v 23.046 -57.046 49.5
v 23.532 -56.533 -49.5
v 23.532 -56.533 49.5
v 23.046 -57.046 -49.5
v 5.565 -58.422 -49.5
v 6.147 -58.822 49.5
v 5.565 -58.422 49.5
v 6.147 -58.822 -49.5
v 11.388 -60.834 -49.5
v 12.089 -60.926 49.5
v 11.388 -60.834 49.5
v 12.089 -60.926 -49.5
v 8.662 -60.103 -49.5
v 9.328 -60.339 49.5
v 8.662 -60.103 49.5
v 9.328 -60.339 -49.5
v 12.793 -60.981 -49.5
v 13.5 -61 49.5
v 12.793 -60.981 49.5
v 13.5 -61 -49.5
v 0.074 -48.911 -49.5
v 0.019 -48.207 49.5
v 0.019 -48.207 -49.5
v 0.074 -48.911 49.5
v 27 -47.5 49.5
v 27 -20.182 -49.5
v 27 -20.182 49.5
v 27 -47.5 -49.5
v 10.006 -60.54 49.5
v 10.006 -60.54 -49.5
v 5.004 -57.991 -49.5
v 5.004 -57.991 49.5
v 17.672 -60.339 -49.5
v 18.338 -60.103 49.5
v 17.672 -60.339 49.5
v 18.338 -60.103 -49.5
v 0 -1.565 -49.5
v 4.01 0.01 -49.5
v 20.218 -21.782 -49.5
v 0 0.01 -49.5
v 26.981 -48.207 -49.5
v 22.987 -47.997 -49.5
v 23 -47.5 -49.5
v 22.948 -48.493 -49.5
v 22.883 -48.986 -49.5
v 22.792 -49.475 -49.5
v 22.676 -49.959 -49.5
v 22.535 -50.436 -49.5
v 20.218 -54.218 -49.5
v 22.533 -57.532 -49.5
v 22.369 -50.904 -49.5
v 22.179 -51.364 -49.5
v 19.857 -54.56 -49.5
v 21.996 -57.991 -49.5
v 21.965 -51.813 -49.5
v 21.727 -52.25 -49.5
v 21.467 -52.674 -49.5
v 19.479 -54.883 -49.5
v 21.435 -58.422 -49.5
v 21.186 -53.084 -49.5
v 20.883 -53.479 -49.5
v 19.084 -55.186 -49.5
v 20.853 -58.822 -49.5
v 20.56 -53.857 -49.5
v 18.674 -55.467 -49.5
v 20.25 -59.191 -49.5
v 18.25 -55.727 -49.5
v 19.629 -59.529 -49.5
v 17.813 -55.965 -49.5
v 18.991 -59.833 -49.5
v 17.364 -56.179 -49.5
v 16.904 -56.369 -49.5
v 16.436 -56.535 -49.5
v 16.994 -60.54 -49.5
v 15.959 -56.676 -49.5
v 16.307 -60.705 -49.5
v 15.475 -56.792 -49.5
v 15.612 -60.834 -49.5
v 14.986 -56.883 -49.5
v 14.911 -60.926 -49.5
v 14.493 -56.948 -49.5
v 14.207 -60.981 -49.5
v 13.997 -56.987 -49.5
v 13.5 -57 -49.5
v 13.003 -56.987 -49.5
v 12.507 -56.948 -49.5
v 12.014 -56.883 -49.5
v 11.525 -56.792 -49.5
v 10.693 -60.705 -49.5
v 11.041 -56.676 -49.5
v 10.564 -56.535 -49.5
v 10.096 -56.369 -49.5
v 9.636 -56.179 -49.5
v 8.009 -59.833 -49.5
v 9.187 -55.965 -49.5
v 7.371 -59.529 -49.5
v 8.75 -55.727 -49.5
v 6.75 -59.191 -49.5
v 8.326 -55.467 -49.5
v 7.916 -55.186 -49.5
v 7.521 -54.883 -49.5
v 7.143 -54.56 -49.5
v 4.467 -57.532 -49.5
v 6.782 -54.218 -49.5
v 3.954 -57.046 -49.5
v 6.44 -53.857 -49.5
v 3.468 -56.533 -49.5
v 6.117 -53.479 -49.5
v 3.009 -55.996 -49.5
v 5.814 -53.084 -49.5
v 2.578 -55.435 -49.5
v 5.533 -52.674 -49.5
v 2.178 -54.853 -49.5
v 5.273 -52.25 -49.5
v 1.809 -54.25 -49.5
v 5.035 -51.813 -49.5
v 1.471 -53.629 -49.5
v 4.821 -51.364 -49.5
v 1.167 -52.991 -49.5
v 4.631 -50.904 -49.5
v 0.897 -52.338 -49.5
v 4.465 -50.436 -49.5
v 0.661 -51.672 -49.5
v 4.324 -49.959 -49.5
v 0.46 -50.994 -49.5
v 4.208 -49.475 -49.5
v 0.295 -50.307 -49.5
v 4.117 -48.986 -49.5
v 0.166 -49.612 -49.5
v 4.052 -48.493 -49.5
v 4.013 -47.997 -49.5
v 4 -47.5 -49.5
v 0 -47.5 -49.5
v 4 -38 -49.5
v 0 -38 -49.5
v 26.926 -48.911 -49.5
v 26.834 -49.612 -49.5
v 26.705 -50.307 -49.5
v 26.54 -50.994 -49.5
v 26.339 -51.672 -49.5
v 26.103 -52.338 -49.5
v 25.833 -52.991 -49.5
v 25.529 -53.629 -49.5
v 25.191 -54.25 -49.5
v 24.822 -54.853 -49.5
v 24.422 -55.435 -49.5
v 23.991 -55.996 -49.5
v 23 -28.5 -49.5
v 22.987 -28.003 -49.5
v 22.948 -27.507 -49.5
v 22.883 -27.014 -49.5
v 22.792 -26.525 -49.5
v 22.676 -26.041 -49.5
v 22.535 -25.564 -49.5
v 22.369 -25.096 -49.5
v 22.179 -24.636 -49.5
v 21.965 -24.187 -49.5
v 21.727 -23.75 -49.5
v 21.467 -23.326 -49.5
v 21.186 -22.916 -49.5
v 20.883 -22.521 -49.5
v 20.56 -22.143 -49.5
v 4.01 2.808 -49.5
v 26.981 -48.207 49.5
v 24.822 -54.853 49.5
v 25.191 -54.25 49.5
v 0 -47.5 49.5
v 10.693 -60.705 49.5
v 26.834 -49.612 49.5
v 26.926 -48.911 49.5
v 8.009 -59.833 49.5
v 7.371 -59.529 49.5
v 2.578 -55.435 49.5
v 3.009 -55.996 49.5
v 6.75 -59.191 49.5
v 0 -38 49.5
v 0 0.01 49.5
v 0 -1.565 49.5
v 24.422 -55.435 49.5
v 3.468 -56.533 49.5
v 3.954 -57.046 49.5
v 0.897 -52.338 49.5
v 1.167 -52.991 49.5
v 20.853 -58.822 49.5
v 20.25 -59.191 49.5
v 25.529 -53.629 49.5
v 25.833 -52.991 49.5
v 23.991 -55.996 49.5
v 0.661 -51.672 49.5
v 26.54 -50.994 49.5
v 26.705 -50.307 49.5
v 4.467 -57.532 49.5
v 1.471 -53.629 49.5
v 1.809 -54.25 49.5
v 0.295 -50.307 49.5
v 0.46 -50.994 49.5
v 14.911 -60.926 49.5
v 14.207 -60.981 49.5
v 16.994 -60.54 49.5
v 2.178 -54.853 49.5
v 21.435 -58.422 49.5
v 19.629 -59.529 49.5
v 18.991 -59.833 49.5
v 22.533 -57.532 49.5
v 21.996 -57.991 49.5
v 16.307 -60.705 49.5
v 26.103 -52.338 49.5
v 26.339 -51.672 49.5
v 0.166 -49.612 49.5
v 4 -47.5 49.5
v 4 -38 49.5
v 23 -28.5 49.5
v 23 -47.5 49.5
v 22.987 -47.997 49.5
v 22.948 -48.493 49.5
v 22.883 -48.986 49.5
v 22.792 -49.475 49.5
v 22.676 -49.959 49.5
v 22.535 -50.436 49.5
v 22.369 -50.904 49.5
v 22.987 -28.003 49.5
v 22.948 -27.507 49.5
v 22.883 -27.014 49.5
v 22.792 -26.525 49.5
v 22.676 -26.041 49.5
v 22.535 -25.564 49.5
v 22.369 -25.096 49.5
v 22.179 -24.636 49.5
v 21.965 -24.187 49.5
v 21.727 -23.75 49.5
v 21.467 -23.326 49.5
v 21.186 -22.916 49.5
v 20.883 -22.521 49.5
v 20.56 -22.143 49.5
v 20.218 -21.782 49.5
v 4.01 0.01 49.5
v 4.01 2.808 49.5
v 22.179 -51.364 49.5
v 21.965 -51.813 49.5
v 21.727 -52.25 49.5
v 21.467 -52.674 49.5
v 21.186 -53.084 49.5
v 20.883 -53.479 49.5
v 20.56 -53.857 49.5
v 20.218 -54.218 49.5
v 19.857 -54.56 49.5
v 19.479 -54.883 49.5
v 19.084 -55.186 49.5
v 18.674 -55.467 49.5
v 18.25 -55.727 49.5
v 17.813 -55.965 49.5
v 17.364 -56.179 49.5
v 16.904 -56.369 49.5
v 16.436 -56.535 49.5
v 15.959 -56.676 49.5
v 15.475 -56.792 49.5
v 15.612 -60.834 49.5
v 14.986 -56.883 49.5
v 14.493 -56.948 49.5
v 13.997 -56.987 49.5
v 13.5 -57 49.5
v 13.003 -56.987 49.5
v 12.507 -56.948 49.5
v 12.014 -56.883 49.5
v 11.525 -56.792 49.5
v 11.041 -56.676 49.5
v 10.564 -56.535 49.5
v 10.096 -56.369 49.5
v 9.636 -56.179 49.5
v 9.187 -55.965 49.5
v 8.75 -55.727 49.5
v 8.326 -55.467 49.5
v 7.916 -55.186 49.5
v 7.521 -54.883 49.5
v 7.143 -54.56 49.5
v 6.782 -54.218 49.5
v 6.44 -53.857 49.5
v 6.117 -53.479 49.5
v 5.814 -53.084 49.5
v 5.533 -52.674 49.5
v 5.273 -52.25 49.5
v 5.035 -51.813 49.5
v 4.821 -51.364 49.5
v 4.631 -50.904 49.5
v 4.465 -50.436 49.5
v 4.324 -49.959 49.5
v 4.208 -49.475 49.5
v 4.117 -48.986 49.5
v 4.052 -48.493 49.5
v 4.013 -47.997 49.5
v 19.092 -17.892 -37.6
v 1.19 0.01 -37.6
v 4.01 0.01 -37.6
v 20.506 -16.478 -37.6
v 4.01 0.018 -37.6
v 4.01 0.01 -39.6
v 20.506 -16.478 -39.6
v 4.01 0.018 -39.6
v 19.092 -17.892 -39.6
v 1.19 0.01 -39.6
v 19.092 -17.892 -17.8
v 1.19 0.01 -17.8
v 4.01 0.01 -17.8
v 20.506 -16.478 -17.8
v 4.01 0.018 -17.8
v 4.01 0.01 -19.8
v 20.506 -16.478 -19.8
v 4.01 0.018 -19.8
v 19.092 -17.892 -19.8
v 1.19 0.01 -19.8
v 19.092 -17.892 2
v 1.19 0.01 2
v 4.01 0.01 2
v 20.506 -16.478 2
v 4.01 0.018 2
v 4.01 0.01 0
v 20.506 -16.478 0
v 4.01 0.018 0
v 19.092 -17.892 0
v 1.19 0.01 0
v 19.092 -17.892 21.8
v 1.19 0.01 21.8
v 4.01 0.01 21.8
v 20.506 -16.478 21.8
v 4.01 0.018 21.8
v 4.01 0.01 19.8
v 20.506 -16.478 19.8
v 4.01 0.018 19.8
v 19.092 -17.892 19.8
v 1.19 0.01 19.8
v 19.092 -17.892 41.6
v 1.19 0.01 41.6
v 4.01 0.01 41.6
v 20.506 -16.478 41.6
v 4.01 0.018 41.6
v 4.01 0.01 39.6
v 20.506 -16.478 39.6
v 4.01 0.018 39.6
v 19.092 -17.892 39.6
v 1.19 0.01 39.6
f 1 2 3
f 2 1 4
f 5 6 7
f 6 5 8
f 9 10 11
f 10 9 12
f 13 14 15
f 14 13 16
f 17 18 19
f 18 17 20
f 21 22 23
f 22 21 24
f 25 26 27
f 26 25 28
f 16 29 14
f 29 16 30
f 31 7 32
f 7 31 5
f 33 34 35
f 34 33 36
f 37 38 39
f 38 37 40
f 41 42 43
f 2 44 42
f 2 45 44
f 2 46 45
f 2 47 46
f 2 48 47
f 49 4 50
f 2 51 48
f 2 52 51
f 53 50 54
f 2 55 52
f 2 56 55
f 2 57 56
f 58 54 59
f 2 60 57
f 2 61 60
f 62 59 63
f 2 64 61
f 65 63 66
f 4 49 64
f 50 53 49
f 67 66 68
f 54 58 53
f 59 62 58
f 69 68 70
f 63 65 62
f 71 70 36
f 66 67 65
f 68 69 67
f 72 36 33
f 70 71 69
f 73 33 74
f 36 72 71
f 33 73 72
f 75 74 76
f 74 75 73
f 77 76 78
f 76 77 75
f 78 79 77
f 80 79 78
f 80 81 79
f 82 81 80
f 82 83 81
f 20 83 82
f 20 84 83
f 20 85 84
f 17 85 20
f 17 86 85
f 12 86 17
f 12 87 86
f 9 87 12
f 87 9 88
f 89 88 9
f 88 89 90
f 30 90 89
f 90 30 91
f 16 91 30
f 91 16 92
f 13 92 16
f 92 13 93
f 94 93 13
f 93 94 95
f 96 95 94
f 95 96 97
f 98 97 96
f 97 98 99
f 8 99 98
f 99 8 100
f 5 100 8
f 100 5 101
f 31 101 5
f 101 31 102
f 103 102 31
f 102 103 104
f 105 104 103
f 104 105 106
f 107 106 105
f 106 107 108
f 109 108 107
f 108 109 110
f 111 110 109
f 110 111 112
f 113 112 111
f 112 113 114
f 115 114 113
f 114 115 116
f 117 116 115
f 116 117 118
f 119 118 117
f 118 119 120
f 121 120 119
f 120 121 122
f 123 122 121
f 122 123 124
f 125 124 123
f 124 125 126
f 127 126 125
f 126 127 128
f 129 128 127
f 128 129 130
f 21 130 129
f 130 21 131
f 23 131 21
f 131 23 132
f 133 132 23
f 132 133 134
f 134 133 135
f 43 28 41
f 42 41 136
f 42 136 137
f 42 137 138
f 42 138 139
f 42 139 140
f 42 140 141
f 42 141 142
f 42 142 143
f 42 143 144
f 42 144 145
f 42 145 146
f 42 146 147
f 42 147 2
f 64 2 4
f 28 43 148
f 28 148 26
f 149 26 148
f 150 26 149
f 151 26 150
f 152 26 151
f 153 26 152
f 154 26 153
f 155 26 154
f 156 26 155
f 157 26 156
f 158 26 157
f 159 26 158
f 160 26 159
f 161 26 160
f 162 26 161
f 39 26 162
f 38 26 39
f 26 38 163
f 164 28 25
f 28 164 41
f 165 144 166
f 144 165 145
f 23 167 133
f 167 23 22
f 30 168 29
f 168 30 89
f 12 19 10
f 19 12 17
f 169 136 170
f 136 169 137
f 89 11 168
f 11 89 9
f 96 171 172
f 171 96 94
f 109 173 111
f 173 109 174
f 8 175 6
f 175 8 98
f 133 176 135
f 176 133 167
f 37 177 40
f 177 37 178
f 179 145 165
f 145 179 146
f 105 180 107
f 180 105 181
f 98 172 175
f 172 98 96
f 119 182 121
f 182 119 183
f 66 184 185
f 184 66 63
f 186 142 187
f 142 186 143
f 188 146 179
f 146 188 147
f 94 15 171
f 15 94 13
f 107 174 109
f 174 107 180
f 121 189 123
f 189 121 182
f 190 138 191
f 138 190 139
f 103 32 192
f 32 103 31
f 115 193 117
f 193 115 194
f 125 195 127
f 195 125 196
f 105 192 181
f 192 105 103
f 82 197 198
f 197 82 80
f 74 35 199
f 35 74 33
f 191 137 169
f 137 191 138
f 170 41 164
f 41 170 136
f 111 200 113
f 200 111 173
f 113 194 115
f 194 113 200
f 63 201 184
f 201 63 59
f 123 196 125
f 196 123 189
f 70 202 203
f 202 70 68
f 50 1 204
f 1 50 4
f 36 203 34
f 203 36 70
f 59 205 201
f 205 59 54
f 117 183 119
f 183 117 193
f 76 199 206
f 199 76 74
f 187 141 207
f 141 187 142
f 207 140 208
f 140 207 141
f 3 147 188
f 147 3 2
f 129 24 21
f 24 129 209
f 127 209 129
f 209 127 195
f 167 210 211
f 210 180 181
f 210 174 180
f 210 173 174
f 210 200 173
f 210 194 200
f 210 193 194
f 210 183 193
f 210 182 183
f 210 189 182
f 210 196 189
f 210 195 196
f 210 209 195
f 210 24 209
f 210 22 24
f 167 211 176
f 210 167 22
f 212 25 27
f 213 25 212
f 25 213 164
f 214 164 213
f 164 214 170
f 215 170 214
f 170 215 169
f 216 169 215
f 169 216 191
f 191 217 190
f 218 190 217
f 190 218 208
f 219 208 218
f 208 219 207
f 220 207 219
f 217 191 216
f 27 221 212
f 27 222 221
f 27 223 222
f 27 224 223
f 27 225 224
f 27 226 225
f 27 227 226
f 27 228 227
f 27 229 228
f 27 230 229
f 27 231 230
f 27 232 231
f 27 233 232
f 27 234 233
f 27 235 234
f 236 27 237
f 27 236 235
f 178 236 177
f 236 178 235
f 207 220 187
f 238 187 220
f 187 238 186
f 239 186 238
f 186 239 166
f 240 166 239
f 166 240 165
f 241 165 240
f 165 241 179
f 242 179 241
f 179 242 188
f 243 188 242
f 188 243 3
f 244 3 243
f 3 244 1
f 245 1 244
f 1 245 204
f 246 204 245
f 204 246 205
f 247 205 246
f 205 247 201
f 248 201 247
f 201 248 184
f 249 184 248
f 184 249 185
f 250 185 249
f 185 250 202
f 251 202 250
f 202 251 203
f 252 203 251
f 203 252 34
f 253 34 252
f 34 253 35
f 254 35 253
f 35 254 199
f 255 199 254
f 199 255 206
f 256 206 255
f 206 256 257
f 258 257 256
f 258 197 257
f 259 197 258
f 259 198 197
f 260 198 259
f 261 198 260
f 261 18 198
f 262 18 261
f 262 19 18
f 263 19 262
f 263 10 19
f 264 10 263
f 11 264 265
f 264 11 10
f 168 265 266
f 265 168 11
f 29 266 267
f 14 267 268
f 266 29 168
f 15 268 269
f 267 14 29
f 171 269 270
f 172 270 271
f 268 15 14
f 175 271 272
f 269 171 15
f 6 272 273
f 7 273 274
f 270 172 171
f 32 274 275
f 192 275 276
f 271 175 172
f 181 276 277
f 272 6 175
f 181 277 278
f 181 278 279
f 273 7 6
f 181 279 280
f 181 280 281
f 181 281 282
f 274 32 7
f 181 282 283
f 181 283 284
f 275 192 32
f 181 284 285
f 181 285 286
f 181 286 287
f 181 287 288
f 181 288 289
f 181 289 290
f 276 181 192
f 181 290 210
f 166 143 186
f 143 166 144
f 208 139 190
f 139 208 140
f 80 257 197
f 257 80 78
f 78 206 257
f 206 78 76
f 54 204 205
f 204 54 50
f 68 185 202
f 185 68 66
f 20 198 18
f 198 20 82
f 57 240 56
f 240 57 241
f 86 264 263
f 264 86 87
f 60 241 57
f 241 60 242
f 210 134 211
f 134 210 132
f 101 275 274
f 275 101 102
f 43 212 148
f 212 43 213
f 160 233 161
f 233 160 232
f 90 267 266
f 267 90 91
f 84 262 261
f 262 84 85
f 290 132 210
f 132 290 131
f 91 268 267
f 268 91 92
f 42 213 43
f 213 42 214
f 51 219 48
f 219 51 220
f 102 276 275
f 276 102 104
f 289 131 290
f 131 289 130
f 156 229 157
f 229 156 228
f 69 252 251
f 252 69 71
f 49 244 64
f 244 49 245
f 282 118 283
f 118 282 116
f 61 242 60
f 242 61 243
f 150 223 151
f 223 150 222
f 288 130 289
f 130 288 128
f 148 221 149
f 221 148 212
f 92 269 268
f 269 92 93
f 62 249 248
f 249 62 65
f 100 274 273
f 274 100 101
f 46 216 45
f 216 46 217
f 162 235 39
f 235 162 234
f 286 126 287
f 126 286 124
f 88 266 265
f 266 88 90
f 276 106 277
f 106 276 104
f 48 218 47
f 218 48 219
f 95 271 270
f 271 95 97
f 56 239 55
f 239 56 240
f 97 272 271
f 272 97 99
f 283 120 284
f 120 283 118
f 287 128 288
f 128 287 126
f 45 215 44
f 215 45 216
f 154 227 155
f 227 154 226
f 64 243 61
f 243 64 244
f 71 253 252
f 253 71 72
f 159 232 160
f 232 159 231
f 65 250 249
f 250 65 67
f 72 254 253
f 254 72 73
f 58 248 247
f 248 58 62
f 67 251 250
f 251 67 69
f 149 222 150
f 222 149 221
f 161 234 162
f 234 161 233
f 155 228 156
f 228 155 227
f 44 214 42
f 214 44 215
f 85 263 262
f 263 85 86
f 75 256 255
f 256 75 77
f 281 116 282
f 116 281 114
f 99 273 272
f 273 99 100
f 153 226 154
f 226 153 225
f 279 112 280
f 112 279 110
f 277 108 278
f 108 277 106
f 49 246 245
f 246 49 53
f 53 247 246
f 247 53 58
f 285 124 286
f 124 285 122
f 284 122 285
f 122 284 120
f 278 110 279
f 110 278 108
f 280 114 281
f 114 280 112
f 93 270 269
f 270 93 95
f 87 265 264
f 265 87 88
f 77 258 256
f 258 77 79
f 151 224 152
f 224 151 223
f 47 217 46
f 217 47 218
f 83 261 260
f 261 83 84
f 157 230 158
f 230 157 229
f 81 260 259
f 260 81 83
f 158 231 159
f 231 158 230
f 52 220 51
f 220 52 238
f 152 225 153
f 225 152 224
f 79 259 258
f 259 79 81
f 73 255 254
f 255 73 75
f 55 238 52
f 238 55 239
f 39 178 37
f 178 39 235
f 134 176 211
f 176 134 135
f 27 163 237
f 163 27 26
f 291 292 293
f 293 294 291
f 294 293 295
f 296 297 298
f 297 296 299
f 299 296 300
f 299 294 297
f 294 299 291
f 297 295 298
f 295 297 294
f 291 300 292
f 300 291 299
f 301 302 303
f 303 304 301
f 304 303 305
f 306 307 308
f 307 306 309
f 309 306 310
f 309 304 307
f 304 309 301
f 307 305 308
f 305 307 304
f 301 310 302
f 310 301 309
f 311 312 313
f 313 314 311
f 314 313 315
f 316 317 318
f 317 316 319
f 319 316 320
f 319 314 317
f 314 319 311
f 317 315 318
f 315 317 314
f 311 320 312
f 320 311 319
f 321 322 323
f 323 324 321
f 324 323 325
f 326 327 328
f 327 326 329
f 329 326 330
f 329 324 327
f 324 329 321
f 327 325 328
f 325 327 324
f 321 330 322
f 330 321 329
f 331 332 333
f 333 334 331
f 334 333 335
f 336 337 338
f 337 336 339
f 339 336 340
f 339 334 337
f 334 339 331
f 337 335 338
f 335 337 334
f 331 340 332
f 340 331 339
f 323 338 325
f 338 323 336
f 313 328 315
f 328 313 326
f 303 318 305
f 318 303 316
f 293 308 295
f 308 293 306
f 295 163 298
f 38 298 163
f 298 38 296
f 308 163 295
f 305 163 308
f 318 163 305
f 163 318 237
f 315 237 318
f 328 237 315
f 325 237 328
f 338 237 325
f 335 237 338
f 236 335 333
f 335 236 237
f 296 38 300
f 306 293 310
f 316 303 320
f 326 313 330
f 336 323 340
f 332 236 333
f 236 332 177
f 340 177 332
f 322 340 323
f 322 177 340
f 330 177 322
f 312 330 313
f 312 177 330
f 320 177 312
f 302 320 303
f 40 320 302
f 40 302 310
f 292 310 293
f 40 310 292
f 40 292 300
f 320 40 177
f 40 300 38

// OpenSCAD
// file: soap-bottle-holder.scad
TOLERANCE       = 2;
CHAMFER         = 2;

BAR_DIAMETER    = 19;
BAR_POS_X       = 30;

BOTTLE_DIAMETER = 60 + TOLERANCE + CHAMFER*2;
BOTTLE_HEIGHT   = 146                          - 70;
BOTTLE_POS_Z    = 220;

THICKNESS       = 6                            -  2;
THICKNESS_2     = 4;


HOLLOWING_WALL  = 4;

SLANT_ANGLE     = 45-5;


LAYER           = .15;
ATOM            = 0.01;

WIDTH           = BOTTLE_DIAMETER*1.5;
SHELF_DIAMETER  = BOTTLE_DIAMETER + THICKNESS *2 + BAR_POS_X*2 - THICKNESS;
BAR_THICKNESS   = BAR_DIAMETER + THICKNESS*2;

$fn = $preview ? 30 : 120;

module scars() {
    // Scars create cracks inside the hook under the surface, to reinforce by replacing infill by inner walls 
    thickness = .2;
    margin = THICKNESS/2 - thickness*.75;
    difference() {
        // scars
        d = BAR_DIAMETER + THICKNESS*2 - margin*2;
        for (y=[3:THICKNESS/2+thickness*3:WIDTH-2])
                hull() {
                translate([BAR_THICKNESS/2, y, BOTTLE_POS_Z + BAR_DIAMETER/2])
                rotate([-90, 0, 0])
                cylinder(d=d, h=thickness);

                translate([BAR_THICKNESS/2, y, BOTTLE_POS_Z - BAR_DIAMETER/2])
                rotate([-90, 0, 0])
                cylinder(d=d, h=thickness);
            }

        // limit scars to not cross the skin
        hull() {
            d2 = BAR_DIAMETER + margin*2;
            translate([BAR_THICKNESS/2, -ATOM, BOTTLE_POS_Z + BAR_DIAMETER/2])
            rotate([-90, 0, 0])
            cylinder(d=d2, h=WIDTH+ATOM*2);

            translate([BAR_THICKNESS/2, -ATOM, BOTTLE_POS_Z - BAR_DIAMETER/2])
            rotate([-90, 0, 0])
            cylinder(d=d2, h=WIDTH+ATOM*2);
 
            translate([BAR_THICKNESS/2 -BAR_DIAMETER, -ATOM, BOTTLE_POS_Z - BAR_DIAMETER/2 -BAR_DIAMETER])
            rotate([-90, 0, 0])
            cylinder(d=d2, h=WIDTH+ATOM*2);
        }
    }
}

module bar(partial=false) {
    translate([0, -WIDTH/2, 0])
    difference() {
        // pillar
        hull() {
            translate([BAR_THICKNESS/2, 0, BOTTLE_POS_Z + BAR_DIAMETER/2])
            rotate([-90, 0, 0])
            cylinder(d=BAR_THICKNESS, h=WIDTH);

            cube([BAR_DIAMETER + THICKNESS*2, WIDTH, ATOM]);
        }
        
        // top hole
        hull() {
            translate([BAR_THICKNESS/2, -ATOM, BOTTLE_POS_Z + BAR_DIAMETER/2])
            rotate([-90, 0, 0])
            cylinder(d=BAR_DIAMETER, h=WIDTH+ATOM*2);

            translate([BAR_THICKNESS/2, -ATOM, BOTTLE_POS_Z - BAR_DIAMETER/2])
            rotate([-90, 0, 0])
            cylinder(d=BAR_DIAMETER, h=WIDTH+ATOM*2);
        }

        // top back opening
        hull() {
            translate([BAR_THICKNESS/2, -ATOM, BOTTLE_POS_Z - BAR_DIAMETER/2])
            rotate([-90, 0, 0])
            cylinder(d=BAR_DIAMETER, h=WIDTH+ATOM*2);

            translate([BAR_THICKNESS/2 - BAR_DIAMETER*2, -ATOM, BOTTLE_POS_Z - BAR_DIAMETER/2 - BAR_DIAMETER*2])
            rotate([-90, 0, 0])
            cylinder(d=BAR_DIAMETER, h=WIDTH+ATOM*2);

            translate([BAR_THICKNESS/2 - BAR_DIAMETER, -ATOM, BOTTLE_POS_Z - BAR_DIAMETER/2])
            rotate([-90, 0, 0])
            cylinder(d=BAR_DIAMETER, h=WIDTH+ATOM*2);
        }

        // front removal
        translate([THICKNESS, -ATOM, -THICKNESS/sqrt(2)/1])
        hull() {
            translate([BAR_THICKNESS, 0, BOTTLE_POS_Z - BAR_DIAMETER*2 + BAR_THICKNESS])
            cube([ATOM, WIDTH+ATOM*2, ATOM]);

            translate([0, 0, BOTTLE_POS_Z - BAR_DIAMETER*2])
            cube([BAR_THICKNESS, WIDTH+ATOM*2, ATOM]);

            cube([BAR_THICKNESS, WIDTH+ATOM*2, ATOM]);
        }
        
        // scars
        if (!partial)
            scars();
    }
}

function get_hook_z() = BOTTLE_POS_Z - BAR_DIAMETER*2;
function get_hook_w() = WIDTH;
function get_hook_th() = BAR_THICKNESS;
function get_th() = THICKNESS;

DY = BOTTLE_DIAMETER+1.5 + THICKNESS/2;

DY2 = BOTTLE_DIAMETER*.75 + THICKNESS;

module side_shape(outer=false) {
    extra = outer ? THICKNESS*2 : 0;
    dh = outer ? 0 : ATOM;
    chamfer = $preview ? 0: CHAMFER;
    hull() {
        translate([-BOTTLE_DIAMETER/4, 0, -dh])
        cylinder(d=BOTTLE_DIAMETER/2 + extra + chamfer, h=BOTTLE_HEIGHT+dh*2);
        translate([BOTTLE_DIAMETER/4, 0, -dh])
        cylinder(d=BOTTLE_DIAMETER/2 + extra + chamfer, h=BOTTLE_HEIGHT+dh*2);
    }
}

module bottle_holder_outer() {
    hull()
    for (y=[-DY2, DY2])
        translate([BOTTLE_DIAMETER/2 + THICKNESS_2, y, 0])
        side_shape(true);
}

module bottle_holder_main_0() {
    spacer();
    difference() {
        // body
        bottle_holder_outer();

        // cavity
        chamfer = $preview ? 0: CHAMFER;
        translate([BOTTLE_DIAMETER/2+THICKNESS, 0, -ATOM])
        cylinder(d=BOTTLE_DIAMETER+chamfer*2, h=BOTTLE_HEIGHT*2);

        for (y=[-DY2, DY2])
            translate([BOTTLE_DIAMETER/2+THICKNESS, y, 0])
            side_shape(false);

        // slanted top
        translate([0, -BOTTLE_DIAMETER*2, BOTTLE_HEIGHT])
        rotate([0, SLANT_ANGLE, 0])
        cube([BOTTLE_DIAMETER*3, BOTTLE_DIAMETER*4, BOTTLE_HEIGHT]);            
    }
}

module bottle_holder_main() {
    minkowski() {
        bottle_holder_main_0();
        if (!$preview)
        sphere(r=CHAMFER, $fn=20);
    }
}

module bottle_holder() {
    translate([0, 0, CHAMFER])
    bottle_holder_main();

    // floor
    intersection() {
        bottle_holder_outer();
        n = 4;
        d = BOTTLE_DIAMETER/(n+1);
        r = THICKNESS * .35;
        for (i=[1: n]) {
            x = -BOTTLE_DIAMETER/2*0  + THICKNESS + d*i;

            hull() {
                translate([x, 0, THICKNESS/2])
                rotate([90, 0, 0])
                cylinder(r=r, h=BOTTLE_DIAMETER*3, center=true);

                translate([x, 0, 0])
                rotate([90, 0, 0])
                cylinder(r=r, h=BOTTLE_DIAMETER*3, center=true);
            }
        }
    }
}

module spacer() {
    w = WIDTH/4;
    w2 = WIDTH/8;
    hull() {
        translate([0, -w/2, BAR_POS_X*2+THICKNESS])
        cube([ATOM, w, 1]);

        translate([-BAR_POS_X, -w2/2, BAR_POS_X+THICKNESS])
        cube([BAR_POS_X, w2, 1]);

        translate([-BAR_POS_X, -w2/2, BAR_POS_X])
        cube([BAR_POS_X, w2, 1]);

        translate([0, -w/2, 0])
        cube([ATOM, w, 1]);
    }
}

module support() {
    // v pillar
    h = BAR_DIAMETER*2;
    translate([0, -WIDTH/2, BOTTLE_POS_Z - h -LAYER*2])
    cube([.3, WIDTH, h]);

    // slanted pillar
    h2 = BAR_DIAMETER*2;
    translate([THICKNESS + BAR_DIAMETER/2, 0, THICKNESS + BAR_DIAMETER/2  + THICKNESS/2])
    translate([0, -WIDTH/2, BOTTLE_POS_Z - h2 -LAYER*3])
    rotate([0, -23.5, 0])
    cube([.3, WIDTH, h2 *.647]);

    // bridge
    th = .3;
    for (y=[0:2:WIDTH]) {
        translate([0, y - WIDTH/2, BOTTLE_POS_Z -LAYER*1 -th])
        cube([THICKNESS, 1, th]);
    }

}

module all() {
    translate([BAR_POS_X, 0, 0]) {
        translate([-2 - CHAMFER/2, 0, 0]) {
            bar();
            //support();
        }

        bottle_holder();
    }
}

module cut(doit) {
    intersection() {
        children();
        if (doit) {
            translate([BAR_POS_X + THICKNESS + BAR_DIAMETER/2, 0, 0])
            //rotate([0, 0, 45])
            translate([0, -WIDTH/2+3+.65, 0])
            cube([1000, 1, 1000], center=true);
            % children();
        }
    }
}

cut(!true) all();


if (0)
%
translate([BAR_POS_X, 0, 0])
translate([BOTTLE_DIAMETER/2+THICKNESS, 0, 0])
cylinder(d=BOTTLE_DIAMETER, h=BOTTLE_HEIGHT);

//%cylinder(r=200, h=60+10);

//%translate([BAR_POS_X+BOTTLE_DIAMETER/2+THICKNESS, 0, 0]) cylinder(d=BOTTLE_DIAMETER-1, 100);
// main file
use <soap-bottle-holder.scad>;

H = get_hook_z();
W = get_hook_w();
TH2 = get_hook_th();
TH = get_th();
ATOM = 0.01;

D = 2;

module hook0() {
    difference() {
        bar(partial=true);

        // remove existing
        translate([-ATOM, -W/2 -ATOM, -ATOM])
        cube([TH+ATOM*2, get_hook_w()+ATOM*2, H]);

        // holes for pins
        w = W * .8;
        n = 5;
        sp = n;
        for (i=[0:n-1]) {
            y = -w/2 + (i/(n-1)) * w;
            translate([0, y, H - D*.6])
            rotate([0, 45, 0])
            cube([D, D, TH2]);
        }
    }
}

module hook() {
    rotate([90, 0, 0])
    translate([0, 0, -H])
    hook0();
}

hook();
